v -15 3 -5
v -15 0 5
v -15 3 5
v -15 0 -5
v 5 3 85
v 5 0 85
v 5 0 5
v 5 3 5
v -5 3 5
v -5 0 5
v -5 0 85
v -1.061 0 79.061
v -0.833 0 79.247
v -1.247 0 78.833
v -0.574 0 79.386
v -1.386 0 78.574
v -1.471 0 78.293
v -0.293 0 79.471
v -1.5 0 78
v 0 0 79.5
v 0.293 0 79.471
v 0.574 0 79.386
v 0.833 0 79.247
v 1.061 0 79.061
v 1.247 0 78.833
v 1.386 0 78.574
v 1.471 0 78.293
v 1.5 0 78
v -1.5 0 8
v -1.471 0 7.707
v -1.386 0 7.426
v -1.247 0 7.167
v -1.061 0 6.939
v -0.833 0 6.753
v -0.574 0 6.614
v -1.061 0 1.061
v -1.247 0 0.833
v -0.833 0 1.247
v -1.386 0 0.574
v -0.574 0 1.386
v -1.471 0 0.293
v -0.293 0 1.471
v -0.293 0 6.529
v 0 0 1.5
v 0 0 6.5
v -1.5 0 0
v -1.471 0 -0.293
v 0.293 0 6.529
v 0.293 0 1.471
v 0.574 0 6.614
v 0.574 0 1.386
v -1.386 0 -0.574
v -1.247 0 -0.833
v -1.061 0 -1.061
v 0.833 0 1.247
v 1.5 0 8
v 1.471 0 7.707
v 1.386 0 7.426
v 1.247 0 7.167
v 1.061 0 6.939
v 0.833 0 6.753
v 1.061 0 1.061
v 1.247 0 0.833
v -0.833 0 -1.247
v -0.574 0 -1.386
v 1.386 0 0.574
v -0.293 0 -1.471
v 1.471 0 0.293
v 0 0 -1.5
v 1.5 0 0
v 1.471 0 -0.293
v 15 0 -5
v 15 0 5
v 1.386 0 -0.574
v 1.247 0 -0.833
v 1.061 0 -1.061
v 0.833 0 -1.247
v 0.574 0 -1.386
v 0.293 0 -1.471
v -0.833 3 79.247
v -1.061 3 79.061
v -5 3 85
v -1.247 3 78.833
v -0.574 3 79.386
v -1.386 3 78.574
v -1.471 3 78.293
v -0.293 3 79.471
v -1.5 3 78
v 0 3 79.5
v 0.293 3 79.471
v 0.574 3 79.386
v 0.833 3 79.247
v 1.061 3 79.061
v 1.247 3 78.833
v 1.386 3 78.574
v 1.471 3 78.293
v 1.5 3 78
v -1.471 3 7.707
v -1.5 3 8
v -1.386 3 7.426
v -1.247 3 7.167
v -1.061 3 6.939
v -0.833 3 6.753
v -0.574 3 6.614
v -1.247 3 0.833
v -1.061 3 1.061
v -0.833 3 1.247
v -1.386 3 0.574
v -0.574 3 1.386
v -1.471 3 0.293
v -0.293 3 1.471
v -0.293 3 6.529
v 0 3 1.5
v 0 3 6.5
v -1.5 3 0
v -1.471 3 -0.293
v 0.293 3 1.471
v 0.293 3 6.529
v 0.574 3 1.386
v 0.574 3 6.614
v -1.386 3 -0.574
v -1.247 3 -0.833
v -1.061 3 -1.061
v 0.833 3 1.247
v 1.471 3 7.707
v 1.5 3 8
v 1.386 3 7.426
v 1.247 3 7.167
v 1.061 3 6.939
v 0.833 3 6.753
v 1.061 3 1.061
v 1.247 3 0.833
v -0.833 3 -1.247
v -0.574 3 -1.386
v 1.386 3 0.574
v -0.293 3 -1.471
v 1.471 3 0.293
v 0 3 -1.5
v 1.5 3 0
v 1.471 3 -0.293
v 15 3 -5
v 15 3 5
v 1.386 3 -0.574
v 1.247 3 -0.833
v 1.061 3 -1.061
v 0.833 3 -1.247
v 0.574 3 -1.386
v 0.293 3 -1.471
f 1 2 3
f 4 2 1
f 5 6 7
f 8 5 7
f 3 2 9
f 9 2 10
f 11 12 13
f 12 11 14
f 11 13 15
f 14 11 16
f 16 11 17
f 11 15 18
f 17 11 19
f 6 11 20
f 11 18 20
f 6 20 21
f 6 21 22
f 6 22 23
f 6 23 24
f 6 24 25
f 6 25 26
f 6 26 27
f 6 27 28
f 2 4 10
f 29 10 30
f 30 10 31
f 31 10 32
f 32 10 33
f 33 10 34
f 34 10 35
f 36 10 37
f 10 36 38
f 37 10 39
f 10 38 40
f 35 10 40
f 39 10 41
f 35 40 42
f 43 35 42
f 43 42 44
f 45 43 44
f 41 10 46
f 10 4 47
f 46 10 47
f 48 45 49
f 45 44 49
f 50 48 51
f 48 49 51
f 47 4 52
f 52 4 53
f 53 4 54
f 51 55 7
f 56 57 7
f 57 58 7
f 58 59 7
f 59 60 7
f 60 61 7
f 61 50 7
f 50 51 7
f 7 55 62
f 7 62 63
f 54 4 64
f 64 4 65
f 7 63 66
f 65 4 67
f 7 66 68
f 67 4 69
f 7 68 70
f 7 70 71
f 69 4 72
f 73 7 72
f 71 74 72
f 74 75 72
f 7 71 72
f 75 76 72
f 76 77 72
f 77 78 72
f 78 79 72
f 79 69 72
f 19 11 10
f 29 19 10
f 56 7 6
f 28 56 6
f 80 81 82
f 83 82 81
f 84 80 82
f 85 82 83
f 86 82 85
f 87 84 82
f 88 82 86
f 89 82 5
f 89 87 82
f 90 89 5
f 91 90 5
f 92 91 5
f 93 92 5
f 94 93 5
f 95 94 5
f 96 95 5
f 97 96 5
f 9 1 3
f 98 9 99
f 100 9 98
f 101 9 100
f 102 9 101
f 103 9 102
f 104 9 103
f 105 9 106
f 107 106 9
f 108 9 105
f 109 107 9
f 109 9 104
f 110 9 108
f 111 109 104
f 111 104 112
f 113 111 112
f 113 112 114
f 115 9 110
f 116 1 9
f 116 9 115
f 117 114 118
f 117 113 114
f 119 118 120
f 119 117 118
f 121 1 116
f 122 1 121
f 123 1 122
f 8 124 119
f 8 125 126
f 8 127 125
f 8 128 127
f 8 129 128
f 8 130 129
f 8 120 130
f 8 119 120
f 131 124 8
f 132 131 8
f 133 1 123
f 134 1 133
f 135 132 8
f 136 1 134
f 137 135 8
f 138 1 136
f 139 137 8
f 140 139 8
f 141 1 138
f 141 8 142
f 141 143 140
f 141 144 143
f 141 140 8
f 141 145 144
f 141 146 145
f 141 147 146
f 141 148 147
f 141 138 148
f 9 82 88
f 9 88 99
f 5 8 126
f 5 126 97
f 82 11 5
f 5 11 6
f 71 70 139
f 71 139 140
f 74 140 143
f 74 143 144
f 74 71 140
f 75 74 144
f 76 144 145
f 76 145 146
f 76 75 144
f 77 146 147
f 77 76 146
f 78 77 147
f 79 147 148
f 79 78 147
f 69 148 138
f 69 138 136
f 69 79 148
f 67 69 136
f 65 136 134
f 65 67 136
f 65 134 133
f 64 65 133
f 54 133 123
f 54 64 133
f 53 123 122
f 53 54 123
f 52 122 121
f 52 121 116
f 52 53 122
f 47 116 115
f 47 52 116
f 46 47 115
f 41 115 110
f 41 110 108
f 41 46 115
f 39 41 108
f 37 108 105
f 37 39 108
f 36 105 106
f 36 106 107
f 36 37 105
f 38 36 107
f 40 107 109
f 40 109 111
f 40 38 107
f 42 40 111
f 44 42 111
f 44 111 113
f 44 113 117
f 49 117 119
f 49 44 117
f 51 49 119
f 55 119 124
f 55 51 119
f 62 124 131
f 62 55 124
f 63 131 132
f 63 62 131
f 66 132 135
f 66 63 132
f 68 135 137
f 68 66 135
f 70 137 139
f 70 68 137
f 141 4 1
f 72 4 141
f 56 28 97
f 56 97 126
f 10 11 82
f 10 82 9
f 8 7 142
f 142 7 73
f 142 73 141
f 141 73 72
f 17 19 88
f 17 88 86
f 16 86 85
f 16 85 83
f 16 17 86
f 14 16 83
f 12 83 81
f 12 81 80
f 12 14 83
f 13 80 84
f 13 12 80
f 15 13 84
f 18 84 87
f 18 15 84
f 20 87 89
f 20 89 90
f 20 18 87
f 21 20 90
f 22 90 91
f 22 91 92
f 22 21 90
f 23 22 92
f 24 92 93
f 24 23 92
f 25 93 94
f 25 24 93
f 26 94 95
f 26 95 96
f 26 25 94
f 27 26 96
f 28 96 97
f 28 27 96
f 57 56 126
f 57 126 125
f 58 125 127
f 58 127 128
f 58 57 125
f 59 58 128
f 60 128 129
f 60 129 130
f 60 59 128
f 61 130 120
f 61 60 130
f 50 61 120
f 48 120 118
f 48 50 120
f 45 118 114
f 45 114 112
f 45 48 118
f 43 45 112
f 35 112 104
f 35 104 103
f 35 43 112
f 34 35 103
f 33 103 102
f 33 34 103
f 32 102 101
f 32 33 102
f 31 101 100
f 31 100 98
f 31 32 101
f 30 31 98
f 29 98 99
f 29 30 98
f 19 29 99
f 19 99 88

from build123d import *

# Parameters (mm, degrees)
SKETCH1_W           = 30
SKETCH1_H           = 10
SKETCH1_R           = 1.5
BOSS_EXTRUDE1_DEPTH = 3
SKETCH2_W           = 10
SKETCH2_H           = 80
BOSS_EXTRUDE2_DEPTH = 3


with BuildPart() as part:
    # Sketch1 → Boss-Extrude1 (new body)
    with BuildSketch(Plane(origin=(0, 0, 0), x_dir=(1, 0, 0), z_dir=(0, 1, 0))):
        Rectangle(SKETCH1_W, SKETCH1_H)
        Circle(SKETCH1_R, mode=Mode.SUBTRACT)
    extrude(amount=BOSS_EXTRUDE1_DEPTH)

    # Sketch2 → Boss-Extrude2 (add)
    with BuildSketch(Plane(origin=(0, 0, 0), x_dir=(1, 0, 0), z_dir=(0, 1, 0))):
        with Locations((0, -45)):
            Rectangle(SKETCH2_W, SKETCH2_H)
        with BuildLine():
            Line((-1.5, -8), (-1.5, -78))
            ThreePointArc((-1.5, -78), (0, -79.5), (1.5, -78))
            Line((1.5, -78), (1.5, -8))
            ThreePointArc((1.5, -8), (0, -6.5), (-1.5, -8))
        make_face(mode=Mode.SUBTRACT)
    extrude(amount=BOSS_EXTRUDE2_DEPTH)


solid = part.part
